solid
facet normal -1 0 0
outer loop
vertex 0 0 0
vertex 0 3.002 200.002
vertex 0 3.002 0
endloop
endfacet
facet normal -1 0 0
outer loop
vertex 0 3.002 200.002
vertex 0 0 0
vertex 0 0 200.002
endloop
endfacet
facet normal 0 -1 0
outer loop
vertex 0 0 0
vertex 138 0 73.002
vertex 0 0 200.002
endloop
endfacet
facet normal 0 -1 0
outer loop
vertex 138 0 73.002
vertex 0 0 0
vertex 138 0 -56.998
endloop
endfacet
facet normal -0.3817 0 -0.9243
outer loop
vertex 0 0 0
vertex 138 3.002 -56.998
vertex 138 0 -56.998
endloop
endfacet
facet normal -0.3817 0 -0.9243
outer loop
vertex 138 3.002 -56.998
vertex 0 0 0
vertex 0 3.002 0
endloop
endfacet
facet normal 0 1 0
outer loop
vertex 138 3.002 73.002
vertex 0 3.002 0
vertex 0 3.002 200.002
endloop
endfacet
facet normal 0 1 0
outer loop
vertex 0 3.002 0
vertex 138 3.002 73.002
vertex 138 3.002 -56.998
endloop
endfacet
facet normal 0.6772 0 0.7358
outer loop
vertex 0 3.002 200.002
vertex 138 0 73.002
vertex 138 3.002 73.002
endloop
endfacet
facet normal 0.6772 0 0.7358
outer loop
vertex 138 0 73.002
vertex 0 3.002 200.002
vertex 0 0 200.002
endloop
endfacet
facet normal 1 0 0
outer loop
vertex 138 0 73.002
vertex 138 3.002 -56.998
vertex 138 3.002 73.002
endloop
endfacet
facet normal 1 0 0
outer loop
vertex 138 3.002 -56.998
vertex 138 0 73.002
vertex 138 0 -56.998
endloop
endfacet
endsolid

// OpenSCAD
// file: config.scad
$fn = 160;

body_height = 1800;
skin_int_dia = 110;

wings_thickness = 3;
wings_nb = 4;
wings_m = 200;
wings_n = 130;
wings_p = 127;
wings_E = 138;

ring_ext_dia = skin_int_dia - 0.4;
// main file
include <config.scad>;

module wing() {
     polyhedron([
                     [0,       0,                                     0],                       // 0
                     [wings_E, 0, 0.002 + wings_m - (wings_p + wings_n)],                       // 1
                     [wings_E, 0, 0.002 + wings_m - wings_p],                                   // 2
                     [0,       0, 0.002 + wings_m],                                             // 3

                     [0,       wings_thickness + 0.002, 0],                                     // 4
                     [wings_E, wings_thickness + 0.002, 0.002 + wings_m - (wings_p + wings_n)], // 5
                     [wings_E, wings_thickness + 0.002, 0.002 + wings_m - wings_p],             // 6
                     [0,       wings_thickness + 0.002, 0.002 + wings_m]],                      // 7
                [
                     [0, 4, 7, 3],   // rear
                     [0, 3, 2, 1],   // left
                     [0, 1, 5, 4],   // bottom
                     [4, 5, 6, 7],   // right
                     [2, 3, 7, 6],   // top
                     [1, 2, 6, 5]]); // front
}

wing();
